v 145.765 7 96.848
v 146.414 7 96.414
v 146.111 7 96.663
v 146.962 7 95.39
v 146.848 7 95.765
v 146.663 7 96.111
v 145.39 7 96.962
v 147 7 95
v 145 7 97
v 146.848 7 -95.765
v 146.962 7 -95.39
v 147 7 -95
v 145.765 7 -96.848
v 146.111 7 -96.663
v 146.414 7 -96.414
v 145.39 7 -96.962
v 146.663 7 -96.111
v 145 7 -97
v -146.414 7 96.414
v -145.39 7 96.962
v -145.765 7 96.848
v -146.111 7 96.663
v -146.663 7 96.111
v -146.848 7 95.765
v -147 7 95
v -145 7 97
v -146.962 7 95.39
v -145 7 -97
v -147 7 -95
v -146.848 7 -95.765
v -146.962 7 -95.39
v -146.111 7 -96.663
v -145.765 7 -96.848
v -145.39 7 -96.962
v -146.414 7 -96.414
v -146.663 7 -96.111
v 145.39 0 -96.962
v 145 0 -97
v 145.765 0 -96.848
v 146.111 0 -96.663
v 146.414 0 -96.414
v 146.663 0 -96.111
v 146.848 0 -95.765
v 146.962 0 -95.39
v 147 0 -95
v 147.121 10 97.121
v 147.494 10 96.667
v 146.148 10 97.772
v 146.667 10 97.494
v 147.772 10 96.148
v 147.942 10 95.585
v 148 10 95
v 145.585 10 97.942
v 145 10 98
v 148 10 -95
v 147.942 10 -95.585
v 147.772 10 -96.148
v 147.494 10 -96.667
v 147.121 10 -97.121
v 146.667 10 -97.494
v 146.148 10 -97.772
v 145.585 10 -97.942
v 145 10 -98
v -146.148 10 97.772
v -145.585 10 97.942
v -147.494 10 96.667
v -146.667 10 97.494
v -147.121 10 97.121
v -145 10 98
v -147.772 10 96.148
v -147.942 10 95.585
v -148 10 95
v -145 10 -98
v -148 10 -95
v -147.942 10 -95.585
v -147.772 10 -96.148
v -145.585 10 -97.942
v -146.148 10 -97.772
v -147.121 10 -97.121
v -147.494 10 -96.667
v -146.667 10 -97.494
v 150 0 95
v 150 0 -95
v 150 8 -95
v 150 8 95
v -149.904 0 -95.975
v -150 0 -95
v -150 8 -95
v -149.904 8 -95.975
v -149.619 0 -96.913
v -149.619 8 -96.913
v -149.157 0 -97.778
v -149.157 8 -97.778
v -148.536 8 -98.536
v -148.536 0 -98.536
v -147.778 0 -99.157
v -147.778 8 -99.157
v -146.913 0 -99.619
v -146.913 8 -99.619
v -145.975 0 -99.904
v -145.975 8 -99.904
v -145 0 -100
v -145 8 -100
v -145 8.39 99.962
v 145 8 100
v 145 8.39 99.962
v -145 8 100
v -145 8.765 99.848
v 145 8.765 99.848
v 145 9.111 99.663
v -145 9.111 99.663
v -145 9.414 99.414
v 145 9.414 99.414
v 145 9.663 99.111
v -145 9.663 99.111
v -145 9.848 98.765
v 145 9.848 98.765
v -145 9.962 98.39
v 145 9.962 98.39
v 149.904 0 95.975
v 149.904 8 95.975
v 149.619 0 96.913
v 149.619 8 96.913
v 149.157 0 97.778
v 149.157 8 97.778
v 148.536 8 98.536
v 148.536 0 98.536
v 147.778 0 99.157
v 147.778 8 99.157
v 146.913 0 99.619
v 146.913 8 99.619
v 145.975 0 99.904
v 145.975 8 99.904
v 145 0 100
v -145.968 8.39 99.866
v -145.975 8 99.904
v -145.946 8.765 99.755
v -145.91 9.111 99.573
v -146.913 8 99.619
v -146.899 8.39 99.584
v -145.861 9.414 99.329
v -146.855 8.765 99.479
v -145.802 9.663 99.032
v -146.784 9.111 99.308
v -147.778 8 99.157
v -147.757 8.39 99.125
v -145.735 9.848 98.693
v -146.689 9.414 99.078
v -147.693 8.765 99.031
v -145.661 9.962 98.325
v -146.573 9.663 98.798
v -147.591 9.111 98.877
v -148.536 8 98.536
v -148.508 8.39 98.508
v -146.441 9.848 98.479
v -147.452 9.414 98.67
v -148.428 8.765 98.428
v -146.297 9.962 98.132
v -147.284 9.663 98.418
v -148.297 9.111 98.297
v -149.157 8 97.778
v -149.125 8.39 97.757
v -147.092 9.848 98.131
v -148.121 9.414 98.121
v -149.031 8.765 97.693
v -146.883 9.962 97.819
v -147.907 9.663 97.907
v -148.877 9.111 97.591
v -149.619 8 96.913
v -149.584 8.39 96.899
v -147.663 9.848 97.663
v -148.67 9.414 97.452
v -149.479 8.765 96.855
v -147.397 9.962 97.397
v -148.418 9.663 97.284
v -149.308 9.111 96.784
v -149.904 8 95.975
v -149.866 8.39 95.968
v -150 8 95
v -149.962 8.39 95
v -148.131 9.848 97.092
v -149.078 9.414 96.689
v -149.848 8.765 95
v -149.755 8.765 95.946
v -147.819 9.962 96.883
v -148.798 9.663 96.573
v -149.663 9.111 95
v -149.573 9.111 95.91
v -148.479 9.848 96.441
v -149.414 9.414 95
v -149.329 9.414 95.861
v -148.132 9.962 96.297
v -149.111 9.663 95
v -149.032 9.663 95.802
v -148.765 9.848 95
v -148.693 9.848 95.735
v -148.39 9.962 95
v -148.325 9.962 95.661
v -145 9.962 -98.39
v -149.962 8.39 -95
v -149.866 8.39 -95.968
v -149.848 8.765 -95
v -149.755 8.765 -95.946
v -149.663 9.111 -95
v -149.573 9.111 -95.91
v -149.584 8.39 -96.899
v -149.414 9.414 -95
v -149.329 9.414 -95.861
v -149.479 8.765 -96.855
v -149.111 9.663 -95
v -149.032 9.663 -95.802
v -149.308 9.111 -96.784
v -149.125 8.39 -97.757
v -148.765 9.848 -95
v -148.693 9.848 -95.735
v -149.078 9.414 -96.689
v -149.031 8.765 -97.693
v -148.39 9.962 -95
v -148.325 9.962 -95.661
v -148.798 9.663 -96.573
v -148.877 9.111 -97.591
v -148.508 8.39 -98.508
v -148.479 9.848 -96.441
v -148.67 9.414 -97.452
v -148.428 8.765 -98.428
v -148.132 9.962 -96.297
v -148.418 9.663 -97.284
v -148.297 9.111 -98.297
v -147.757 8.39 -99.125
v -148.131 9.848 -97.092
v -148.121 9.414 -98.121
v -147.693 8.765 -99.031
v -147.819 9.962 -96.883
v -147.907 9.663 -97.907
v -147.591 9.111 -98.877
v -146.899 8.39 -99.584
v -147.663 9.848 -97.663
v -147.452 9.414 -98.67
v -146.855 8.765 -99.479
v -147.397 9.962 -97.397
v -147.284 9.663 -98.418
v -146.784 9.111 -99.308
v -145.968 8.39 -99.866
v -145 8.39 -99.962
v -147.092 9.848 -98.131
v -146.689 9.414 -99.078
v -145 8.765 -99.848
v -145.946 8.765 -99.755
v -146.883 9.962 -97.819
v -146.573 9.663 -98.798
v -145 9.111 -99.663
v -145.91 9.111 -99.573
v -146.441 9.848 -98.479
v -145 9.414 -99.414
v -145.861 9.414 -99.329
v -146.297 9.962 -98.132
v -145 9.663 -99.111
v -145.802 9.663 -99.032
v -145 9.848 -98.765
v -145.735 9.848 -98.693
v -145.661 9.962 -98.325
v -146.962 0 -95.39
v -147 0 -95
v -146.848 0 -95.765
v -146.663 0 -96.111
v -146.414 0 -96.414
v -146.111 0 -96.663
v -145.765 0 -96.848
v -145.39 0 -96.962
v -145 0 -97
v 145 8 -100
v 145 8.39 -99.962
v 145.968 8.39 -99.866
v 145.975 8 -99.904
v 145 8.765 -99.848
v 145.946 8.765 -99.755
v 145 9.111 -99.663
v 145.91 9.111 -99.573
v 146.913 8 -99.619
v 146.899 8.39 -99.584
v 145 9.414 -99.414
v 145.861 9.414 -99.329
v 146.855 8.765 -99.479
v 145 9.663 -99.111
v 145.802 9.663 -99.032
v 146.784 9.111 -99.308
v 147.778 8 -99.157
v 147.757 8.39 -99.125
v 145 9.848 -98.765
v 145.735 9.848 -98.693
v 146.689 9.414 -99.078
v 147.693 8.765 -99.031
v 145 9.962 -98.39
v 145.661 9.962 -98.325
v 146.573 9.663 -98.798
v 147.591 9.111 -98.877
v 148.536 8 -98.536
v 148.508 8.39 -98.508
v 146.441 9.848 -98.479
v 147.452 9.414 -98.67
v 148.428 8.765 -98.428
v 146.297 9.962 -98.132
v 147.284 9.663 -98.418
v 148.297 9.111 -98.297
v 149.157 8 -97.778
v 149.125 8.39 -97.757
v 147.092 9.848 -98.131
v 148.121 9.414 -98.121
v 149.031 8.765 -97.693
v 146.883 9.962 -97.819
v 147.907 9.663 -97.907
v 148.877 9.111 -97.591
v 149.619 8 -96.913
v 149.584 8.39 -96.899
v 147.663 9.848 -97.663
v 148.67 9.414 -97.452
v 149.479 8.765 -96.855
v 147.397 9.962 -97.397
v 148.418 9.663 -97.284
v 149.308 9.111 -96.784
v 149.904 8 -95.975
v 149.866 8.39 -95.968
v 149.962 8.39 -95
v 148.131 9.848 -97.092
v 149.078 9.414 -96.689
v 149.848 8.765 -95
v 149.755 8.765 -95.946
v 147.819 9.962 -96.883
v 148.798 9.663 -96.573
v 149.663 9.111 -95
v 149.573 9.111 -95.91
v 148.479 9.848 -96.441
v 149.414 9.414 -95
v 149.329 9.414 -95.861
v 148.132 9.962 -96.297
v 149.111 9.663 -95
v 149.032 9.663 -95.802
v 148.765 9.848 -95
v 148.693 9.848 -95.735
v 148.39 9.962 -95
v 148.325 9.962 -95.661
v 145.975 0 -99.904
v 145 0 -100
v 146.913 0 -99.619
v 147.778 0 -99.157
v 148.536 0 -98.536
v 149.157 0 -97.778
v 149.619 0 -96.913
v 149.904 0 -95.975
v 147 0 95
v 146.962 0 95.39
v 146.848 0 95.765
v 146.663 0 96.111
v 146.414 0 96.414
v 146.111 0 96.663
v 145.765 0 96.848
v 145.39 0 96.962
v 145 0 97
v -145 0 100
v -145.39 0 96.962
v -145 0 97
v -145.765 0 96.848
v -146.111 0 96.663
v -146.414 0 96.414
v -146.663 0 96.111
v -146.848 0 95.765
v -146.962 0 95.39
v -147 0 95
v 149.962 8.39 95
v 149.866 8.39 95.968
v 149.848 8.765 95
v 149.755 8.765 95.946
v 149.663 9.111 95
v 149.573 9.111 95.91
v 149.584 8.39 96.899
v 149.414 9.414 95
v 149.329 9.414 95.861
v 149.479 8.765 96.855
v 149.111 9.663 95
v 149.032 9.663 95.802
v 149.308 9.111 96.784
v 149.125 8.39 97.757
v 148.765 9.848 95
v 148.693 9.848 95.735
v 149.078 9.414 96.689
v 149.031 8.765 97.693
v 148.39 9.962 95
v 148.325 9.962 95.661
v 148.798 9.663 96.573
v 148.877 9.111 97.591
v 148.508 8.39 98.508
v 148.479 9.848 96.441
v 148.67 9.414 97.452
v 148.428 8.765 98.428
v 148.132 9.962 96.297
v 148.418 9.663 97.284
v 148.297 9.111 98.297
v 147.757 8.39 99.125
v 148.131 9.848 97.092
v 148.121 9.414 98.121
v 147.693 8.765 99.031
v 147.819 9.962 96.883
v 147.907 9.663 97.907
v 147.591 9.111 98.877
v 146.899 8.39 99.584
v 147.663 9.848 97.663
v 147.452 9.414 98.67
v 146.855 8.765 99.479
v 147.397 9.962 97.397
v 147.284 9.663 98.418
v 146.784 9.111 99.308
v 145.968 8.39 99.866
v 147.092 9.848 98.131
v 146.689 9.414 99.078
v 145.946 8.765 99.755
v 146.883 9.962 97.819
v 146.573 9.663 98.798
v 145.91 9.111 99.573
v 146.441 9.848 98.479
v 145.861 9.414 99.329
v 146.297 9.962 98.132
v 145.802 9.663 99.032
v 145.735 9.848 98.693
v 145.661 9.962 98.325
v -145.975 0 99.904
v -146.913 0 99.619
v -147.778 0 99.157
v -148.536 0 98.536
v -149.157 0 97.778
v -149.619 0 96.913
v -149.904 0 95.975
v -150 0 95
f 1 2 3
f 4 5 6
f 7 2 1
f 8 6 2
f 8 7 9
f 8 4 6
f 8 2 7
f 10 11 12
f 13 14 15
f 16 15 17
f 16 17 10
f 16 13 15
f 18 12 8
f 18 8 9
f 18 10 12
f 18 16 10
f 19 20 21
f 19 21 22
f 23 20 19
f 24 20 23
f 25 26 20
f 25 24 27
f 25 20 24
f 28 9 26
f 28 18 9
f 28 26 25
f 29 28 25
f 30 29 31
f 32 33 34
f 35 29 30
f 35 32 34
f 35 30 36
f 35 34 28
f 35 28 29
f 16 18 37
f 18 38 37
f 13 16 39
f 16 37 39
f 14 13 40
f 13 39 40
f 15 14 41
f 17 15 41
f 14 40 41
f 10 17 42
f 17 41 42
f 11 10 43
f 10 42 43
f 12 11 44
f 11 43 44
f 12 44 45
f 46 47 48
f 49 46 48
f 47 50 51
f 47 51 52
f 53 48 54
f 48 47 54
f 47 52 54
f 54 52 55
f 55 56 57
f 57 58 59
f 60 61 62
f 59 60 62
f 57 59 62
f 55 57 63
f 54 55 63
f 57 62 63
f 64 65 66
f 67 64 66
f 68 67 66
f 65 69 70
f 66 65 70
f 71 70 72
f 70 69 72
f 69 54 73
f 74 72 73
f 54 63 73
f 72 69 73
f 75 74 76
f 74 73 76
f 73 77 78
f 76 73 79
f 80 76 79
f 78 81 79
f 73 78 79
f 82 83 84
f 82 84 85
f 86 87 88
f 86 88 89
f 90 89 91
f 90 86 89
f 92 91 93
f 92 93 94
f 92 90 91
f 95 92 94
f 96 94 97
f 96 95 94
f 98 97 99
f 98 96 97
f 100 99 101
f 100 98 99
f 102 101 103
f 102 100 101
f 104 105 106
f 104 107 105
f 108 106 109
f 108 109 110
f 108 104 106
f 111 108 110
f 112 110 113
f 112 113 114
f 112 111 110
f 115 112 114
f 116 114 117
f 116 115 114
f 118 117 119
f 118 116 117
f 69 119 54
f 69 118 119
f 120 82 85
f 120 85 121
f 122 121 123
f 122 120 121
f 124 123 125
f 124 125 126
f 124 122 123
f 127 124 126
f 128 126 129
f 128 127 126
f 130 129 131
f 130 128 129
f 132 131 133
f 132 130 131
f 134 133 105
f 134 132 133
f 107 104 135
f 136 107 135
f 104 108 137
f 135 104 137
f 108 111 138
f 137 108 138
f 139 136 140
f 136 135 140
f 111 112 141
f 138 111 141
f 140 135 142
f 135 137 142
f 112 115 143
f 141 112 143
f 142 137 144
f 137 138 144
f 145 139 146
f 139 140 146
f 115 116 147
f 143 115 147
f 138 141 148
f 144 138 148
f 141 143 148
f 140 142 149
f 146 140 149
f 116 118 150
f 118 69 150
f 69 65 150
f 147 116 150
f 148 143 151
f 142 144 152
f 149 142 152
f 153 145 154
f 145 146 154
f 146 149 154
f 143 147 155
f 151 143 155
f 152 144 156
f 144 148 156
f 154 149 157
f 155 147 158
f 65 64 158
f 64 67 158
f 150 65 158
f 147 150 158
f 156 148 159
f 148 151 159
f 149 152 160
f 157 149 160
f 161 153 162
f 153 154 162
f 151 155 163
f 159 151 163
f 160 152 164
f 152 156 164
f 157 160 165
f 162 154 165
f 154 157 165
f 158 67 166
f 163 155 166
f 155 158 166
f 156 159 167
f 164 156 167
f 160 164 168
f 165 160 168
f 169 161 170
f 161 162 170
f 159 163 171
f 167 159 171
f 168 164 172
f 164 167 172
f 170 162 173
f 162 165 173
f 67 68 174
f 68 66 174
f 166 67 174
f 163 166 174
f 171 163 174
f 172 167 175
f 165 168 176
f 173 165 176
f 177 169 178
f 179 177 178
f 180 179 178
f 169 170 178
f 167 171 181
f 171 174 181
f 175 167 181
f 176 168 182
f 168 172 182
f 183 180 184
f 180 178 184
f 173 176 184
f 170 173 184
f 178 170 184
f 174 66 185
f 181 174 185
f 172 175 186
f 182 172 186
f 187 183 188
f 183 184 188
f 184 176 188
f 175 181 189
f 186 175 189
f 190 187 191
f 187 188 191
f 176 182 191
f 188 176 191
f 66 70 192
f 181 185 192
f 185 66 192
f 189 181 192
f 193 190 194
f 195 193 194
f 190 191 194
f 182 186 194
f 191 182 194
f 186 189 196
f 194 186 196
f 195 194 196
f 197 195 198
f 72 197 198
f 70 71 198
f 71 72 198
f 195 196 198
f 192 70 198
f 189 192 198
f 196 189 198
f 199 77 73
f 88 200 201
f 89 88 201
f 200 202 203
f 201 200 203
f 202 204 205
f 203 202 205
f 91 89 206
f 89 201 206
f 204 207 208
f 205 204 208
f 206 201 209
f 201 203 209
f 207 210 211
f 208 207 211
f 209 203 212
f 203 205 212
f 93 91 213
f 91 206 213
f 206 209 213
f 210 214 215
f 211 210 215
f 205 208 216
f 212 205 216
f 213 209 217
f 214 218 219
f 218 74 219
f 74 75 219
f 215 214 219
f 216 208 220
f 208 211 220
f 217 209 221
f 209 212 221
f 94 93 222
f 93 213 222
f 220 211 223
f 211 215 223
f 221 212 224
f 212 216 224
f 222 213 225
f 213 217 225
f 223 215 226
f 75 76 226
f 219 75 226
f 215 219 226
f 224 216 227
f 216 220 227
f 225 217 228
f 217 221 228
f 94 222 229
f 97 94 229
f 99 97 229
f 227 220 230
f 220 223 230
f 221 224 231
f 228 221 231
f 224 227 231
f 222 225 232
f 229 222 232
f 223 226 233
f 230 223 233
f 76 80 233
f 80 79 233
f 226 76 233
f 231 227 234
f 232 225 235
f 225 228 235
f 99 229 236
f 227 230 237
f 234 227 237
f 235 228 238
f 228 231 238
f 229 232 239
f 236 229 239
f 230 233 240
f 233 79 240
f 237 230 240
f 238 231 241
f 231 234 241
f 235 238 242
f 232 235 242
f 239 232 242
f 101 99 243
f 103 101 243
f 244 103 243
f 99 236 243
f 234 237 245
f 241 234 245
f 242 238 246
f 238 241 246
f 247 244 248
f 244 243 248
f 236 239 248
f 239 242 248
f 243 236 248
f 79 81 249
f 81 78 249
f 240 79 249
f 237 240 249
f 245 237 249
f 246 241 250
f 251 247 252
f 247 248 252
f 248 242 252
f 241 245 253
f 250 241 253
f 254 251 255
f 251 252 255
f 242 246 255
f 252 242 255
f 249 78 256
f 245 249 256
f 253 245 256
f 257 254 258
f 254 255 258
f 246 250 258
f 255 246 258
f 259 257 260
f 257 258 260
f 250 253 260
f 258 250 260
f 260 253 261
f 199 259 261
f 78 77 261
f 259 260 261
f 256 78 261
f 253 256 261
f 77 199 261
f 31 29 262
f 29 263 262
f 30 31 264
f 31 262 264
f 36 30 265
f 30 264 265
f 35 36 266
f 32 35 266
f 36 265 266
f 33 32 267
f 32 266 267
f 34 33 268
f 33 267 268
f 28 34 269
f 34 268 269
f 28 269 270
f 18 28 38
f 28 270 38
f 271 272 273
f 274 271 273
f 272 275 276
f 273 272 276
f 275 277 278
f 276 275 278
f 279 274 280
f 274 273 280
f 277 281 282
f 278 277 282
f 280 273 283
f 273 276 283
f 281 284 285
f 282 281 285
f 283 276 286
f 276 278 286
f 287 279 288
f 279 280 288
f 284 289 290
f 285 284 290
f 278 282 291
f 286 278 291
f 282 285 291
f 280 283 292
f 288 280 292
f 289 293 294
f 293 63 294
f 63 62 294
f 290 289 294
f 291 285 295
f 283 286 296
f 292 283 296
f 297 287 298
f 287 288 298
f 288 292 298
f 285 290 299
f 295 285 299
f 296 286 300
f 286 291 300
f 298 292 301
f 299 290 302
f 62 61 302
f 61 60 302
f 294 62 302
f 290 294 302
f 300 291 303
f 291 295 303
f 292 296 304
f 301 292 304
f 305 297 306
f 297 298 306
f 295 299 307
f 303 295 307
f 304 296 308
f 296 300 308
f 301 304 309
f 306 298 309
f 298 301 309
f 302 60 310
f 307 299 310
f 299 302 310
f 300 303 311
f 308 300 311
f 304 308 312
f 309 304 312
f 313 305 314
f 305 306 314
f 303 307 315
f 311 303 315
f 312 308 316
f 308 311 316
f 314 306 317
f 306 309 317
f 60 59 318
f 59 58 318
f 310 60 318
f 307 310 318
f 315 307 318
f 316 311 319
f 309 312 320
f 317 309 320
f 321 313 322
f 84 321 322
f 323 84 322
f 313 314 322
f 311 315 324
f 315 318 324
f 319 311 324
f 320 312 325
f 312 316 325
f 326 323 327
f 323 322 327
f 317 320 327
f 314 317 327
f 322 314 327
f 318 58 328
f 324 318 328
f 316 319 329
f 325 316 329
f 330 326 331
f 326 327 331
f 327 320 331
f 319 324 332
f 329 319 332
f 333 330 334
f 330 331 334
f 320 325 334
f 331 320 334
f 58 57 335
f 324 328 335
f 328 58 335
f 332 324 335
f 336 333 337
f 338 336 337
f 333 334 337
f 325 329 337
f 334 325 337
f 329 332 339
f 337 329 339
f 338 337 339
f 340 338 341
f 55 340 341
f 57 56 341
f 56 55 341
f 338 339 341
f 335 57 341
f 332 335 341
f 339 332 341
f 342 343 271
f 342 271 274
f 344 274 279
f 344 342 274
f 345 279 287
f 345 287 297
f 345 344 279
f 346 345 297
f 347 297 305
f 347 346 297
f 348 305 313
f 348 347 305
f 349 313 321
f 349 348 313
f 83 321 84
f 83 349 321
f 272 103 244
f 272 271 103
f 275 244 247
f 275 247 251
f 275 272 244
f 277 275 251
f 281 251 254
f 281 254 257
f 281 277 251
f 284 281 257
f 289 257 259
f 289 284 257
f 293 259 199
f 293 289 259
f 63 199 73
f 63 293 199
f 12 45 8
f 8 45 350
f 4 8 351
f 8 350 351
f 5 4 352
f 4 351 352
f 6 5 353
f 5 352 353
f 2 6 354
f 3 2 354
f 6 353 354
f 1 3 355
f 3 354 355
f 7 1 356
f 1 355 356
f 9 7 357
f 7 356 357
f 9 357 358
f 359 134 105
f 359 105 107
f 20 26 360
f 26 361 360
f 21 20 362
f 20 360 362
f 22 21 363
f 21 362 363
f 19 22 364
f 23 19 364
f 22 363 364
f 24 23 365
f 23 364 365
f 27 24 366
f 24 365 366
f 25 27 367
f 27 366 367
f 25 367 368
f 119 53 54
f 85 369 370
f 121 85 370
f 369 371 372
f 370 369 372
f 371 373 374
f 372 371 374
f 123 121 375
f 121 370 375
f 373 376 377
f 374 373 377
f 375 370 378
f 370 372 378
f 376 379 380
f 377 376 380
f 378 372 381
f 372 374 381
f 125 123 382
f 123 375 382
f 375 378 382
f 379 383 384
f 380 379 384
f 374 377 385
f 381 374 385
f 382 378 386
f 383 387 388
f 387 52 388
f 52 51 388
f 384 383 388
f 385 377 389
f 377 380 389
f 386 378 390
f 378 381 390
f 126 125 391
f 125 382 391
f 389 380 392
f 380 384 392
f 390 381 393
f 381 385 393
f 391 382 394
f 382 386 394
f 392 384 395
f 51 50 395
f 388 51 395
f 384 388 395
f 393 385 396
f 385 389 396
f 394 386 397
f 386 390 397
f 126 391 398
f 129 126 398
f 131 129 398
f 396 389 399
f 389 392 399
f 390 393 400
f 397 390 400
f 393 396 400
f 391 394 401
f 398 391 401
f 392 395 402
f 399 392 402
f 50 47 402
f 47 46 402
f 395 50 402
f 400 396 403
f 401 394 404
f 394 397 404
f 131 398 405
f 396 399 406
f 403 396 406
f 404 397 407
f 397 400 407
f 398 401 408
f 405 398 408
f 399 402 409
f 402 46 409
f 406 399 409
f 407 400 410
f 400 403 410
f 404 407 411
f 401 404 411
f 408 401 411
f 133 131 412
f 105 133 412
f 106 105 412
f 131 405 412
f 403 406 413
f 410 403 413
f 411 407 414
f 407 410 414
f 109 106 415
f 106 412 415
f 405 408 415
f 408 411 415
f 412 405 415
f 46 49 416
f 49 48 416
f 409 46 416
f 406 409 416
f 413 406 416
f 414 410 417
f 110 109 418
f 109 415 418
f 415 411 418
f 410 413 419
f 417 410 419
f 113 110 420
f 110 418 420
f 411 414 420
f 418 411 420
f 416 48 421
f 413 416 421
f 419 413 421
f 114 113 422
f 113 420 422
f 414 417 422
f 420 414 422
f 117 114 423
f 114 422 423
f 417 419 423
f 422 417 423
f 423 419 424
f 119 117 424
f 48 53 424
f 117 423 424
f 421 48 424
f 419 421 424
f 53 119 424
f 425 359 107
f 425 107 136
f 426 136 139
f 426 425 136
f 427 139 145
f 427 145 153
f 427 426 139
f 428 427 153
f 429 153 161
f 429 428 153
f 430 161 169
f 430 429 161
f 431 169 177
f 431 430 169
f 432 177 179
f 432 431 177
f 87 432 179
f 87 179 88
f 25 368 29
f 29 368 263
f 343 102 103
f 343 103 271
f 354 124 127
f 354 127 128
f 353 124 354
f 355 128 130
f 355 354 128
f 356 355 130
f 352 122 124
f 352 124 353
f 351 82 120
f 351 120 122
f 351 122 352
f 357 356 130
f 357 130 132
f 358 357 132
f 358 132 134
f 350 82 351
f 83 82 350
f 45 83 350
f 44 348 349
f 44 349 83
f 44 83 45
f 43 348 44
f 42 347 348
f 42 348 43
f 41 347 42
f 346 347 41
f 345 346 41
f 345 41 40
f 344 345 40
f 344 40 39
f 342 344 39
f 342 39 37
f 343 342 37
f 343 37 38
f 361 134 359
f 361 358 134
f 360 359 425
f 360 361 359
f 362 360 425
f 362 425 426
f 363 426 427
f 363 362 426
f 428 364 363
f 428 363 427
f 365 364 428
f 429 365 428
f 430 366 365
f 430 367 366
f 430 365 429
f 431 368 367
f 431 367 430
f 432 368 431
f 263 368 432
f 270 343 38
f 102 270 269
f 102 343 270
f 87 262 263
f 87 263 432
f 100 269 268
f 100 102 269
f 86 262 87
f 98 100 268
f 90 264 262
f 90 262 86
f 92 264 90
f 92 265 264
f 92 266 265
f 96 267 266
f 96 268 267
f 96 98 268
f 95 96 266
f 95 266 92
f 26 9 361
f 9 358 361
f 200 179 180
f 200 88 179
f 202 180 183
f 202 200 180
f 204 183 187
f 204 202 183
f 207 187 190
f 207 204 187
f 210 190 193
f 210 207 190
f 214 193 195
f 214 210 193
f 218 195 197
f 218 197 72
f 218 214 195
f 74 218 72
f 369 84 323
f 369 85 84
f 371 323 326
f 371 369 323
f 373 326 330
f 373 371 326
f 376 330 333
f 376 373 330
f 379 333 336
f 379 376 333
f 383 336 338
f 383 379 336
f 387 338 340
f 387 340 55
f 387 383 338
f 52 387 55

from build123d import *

# Parameters (mm, degrees)
BOSS_EXTRUDE1_DEPTH = 10
SHELL1_T            = -3
FILLET1_R           = 2


with BuildPart() as part:
    # Sketch1 → Boss-Extrude1 (new body)
    with BuildSketch(Plane(origin=(0, 0, 0), x_dir=(1, 0, 0), z_dir=(0, 1, 0))):
        with BuildLine():
            Line((-145, 100), (145, 100))
            ThreePointArc((145, 100), (148.535533906, 98.535533906), (150, 95))
            Line((150, 95), (150, -95))
            ThreePointArc((150, -95), (148.535533906, -98.535533906), (145, -100))
            Line((145, -100), (-145, -100))
            ThreePointArc((-145, -100), (-148.535533906, -98.535533906), (-150, -95))
            Line((-150, -95), (-150, 95))
            ThreePointArc((-150, 95), (-148.535533906, 98.535533906), (-145, 100))
        make_face()
    extrude(amount=BOSS_EXTRUDE1_DEPTH)

    # Shell1
    shell1_openings = [part.faces().sort_by_distance(p)[0] for p in [
        (0, 0, 0),
    ]]
    offset(amount=SHELL1_T, openings=shell1_openings, kind=Kind.INTERSECTION)

    # Fillet1
    fillet1_edges = [part.edges().sort_by_distance(p)[0] for p in [
        (-148.535533906, 10, -98.535533906),
        (-150, 10, 0),
        (-148.535533906, 10, 98.535533906),
        (0, 10, 100),
        (148.535533906, 10, 98.535533906),
        (150, 10, 0),
        (148.535533906, 10, -98.535533906),
        (0, 10, -100),
    ]]
    fillet(fillet1_edges, radius=FILLET1_R)


solid = part.part
